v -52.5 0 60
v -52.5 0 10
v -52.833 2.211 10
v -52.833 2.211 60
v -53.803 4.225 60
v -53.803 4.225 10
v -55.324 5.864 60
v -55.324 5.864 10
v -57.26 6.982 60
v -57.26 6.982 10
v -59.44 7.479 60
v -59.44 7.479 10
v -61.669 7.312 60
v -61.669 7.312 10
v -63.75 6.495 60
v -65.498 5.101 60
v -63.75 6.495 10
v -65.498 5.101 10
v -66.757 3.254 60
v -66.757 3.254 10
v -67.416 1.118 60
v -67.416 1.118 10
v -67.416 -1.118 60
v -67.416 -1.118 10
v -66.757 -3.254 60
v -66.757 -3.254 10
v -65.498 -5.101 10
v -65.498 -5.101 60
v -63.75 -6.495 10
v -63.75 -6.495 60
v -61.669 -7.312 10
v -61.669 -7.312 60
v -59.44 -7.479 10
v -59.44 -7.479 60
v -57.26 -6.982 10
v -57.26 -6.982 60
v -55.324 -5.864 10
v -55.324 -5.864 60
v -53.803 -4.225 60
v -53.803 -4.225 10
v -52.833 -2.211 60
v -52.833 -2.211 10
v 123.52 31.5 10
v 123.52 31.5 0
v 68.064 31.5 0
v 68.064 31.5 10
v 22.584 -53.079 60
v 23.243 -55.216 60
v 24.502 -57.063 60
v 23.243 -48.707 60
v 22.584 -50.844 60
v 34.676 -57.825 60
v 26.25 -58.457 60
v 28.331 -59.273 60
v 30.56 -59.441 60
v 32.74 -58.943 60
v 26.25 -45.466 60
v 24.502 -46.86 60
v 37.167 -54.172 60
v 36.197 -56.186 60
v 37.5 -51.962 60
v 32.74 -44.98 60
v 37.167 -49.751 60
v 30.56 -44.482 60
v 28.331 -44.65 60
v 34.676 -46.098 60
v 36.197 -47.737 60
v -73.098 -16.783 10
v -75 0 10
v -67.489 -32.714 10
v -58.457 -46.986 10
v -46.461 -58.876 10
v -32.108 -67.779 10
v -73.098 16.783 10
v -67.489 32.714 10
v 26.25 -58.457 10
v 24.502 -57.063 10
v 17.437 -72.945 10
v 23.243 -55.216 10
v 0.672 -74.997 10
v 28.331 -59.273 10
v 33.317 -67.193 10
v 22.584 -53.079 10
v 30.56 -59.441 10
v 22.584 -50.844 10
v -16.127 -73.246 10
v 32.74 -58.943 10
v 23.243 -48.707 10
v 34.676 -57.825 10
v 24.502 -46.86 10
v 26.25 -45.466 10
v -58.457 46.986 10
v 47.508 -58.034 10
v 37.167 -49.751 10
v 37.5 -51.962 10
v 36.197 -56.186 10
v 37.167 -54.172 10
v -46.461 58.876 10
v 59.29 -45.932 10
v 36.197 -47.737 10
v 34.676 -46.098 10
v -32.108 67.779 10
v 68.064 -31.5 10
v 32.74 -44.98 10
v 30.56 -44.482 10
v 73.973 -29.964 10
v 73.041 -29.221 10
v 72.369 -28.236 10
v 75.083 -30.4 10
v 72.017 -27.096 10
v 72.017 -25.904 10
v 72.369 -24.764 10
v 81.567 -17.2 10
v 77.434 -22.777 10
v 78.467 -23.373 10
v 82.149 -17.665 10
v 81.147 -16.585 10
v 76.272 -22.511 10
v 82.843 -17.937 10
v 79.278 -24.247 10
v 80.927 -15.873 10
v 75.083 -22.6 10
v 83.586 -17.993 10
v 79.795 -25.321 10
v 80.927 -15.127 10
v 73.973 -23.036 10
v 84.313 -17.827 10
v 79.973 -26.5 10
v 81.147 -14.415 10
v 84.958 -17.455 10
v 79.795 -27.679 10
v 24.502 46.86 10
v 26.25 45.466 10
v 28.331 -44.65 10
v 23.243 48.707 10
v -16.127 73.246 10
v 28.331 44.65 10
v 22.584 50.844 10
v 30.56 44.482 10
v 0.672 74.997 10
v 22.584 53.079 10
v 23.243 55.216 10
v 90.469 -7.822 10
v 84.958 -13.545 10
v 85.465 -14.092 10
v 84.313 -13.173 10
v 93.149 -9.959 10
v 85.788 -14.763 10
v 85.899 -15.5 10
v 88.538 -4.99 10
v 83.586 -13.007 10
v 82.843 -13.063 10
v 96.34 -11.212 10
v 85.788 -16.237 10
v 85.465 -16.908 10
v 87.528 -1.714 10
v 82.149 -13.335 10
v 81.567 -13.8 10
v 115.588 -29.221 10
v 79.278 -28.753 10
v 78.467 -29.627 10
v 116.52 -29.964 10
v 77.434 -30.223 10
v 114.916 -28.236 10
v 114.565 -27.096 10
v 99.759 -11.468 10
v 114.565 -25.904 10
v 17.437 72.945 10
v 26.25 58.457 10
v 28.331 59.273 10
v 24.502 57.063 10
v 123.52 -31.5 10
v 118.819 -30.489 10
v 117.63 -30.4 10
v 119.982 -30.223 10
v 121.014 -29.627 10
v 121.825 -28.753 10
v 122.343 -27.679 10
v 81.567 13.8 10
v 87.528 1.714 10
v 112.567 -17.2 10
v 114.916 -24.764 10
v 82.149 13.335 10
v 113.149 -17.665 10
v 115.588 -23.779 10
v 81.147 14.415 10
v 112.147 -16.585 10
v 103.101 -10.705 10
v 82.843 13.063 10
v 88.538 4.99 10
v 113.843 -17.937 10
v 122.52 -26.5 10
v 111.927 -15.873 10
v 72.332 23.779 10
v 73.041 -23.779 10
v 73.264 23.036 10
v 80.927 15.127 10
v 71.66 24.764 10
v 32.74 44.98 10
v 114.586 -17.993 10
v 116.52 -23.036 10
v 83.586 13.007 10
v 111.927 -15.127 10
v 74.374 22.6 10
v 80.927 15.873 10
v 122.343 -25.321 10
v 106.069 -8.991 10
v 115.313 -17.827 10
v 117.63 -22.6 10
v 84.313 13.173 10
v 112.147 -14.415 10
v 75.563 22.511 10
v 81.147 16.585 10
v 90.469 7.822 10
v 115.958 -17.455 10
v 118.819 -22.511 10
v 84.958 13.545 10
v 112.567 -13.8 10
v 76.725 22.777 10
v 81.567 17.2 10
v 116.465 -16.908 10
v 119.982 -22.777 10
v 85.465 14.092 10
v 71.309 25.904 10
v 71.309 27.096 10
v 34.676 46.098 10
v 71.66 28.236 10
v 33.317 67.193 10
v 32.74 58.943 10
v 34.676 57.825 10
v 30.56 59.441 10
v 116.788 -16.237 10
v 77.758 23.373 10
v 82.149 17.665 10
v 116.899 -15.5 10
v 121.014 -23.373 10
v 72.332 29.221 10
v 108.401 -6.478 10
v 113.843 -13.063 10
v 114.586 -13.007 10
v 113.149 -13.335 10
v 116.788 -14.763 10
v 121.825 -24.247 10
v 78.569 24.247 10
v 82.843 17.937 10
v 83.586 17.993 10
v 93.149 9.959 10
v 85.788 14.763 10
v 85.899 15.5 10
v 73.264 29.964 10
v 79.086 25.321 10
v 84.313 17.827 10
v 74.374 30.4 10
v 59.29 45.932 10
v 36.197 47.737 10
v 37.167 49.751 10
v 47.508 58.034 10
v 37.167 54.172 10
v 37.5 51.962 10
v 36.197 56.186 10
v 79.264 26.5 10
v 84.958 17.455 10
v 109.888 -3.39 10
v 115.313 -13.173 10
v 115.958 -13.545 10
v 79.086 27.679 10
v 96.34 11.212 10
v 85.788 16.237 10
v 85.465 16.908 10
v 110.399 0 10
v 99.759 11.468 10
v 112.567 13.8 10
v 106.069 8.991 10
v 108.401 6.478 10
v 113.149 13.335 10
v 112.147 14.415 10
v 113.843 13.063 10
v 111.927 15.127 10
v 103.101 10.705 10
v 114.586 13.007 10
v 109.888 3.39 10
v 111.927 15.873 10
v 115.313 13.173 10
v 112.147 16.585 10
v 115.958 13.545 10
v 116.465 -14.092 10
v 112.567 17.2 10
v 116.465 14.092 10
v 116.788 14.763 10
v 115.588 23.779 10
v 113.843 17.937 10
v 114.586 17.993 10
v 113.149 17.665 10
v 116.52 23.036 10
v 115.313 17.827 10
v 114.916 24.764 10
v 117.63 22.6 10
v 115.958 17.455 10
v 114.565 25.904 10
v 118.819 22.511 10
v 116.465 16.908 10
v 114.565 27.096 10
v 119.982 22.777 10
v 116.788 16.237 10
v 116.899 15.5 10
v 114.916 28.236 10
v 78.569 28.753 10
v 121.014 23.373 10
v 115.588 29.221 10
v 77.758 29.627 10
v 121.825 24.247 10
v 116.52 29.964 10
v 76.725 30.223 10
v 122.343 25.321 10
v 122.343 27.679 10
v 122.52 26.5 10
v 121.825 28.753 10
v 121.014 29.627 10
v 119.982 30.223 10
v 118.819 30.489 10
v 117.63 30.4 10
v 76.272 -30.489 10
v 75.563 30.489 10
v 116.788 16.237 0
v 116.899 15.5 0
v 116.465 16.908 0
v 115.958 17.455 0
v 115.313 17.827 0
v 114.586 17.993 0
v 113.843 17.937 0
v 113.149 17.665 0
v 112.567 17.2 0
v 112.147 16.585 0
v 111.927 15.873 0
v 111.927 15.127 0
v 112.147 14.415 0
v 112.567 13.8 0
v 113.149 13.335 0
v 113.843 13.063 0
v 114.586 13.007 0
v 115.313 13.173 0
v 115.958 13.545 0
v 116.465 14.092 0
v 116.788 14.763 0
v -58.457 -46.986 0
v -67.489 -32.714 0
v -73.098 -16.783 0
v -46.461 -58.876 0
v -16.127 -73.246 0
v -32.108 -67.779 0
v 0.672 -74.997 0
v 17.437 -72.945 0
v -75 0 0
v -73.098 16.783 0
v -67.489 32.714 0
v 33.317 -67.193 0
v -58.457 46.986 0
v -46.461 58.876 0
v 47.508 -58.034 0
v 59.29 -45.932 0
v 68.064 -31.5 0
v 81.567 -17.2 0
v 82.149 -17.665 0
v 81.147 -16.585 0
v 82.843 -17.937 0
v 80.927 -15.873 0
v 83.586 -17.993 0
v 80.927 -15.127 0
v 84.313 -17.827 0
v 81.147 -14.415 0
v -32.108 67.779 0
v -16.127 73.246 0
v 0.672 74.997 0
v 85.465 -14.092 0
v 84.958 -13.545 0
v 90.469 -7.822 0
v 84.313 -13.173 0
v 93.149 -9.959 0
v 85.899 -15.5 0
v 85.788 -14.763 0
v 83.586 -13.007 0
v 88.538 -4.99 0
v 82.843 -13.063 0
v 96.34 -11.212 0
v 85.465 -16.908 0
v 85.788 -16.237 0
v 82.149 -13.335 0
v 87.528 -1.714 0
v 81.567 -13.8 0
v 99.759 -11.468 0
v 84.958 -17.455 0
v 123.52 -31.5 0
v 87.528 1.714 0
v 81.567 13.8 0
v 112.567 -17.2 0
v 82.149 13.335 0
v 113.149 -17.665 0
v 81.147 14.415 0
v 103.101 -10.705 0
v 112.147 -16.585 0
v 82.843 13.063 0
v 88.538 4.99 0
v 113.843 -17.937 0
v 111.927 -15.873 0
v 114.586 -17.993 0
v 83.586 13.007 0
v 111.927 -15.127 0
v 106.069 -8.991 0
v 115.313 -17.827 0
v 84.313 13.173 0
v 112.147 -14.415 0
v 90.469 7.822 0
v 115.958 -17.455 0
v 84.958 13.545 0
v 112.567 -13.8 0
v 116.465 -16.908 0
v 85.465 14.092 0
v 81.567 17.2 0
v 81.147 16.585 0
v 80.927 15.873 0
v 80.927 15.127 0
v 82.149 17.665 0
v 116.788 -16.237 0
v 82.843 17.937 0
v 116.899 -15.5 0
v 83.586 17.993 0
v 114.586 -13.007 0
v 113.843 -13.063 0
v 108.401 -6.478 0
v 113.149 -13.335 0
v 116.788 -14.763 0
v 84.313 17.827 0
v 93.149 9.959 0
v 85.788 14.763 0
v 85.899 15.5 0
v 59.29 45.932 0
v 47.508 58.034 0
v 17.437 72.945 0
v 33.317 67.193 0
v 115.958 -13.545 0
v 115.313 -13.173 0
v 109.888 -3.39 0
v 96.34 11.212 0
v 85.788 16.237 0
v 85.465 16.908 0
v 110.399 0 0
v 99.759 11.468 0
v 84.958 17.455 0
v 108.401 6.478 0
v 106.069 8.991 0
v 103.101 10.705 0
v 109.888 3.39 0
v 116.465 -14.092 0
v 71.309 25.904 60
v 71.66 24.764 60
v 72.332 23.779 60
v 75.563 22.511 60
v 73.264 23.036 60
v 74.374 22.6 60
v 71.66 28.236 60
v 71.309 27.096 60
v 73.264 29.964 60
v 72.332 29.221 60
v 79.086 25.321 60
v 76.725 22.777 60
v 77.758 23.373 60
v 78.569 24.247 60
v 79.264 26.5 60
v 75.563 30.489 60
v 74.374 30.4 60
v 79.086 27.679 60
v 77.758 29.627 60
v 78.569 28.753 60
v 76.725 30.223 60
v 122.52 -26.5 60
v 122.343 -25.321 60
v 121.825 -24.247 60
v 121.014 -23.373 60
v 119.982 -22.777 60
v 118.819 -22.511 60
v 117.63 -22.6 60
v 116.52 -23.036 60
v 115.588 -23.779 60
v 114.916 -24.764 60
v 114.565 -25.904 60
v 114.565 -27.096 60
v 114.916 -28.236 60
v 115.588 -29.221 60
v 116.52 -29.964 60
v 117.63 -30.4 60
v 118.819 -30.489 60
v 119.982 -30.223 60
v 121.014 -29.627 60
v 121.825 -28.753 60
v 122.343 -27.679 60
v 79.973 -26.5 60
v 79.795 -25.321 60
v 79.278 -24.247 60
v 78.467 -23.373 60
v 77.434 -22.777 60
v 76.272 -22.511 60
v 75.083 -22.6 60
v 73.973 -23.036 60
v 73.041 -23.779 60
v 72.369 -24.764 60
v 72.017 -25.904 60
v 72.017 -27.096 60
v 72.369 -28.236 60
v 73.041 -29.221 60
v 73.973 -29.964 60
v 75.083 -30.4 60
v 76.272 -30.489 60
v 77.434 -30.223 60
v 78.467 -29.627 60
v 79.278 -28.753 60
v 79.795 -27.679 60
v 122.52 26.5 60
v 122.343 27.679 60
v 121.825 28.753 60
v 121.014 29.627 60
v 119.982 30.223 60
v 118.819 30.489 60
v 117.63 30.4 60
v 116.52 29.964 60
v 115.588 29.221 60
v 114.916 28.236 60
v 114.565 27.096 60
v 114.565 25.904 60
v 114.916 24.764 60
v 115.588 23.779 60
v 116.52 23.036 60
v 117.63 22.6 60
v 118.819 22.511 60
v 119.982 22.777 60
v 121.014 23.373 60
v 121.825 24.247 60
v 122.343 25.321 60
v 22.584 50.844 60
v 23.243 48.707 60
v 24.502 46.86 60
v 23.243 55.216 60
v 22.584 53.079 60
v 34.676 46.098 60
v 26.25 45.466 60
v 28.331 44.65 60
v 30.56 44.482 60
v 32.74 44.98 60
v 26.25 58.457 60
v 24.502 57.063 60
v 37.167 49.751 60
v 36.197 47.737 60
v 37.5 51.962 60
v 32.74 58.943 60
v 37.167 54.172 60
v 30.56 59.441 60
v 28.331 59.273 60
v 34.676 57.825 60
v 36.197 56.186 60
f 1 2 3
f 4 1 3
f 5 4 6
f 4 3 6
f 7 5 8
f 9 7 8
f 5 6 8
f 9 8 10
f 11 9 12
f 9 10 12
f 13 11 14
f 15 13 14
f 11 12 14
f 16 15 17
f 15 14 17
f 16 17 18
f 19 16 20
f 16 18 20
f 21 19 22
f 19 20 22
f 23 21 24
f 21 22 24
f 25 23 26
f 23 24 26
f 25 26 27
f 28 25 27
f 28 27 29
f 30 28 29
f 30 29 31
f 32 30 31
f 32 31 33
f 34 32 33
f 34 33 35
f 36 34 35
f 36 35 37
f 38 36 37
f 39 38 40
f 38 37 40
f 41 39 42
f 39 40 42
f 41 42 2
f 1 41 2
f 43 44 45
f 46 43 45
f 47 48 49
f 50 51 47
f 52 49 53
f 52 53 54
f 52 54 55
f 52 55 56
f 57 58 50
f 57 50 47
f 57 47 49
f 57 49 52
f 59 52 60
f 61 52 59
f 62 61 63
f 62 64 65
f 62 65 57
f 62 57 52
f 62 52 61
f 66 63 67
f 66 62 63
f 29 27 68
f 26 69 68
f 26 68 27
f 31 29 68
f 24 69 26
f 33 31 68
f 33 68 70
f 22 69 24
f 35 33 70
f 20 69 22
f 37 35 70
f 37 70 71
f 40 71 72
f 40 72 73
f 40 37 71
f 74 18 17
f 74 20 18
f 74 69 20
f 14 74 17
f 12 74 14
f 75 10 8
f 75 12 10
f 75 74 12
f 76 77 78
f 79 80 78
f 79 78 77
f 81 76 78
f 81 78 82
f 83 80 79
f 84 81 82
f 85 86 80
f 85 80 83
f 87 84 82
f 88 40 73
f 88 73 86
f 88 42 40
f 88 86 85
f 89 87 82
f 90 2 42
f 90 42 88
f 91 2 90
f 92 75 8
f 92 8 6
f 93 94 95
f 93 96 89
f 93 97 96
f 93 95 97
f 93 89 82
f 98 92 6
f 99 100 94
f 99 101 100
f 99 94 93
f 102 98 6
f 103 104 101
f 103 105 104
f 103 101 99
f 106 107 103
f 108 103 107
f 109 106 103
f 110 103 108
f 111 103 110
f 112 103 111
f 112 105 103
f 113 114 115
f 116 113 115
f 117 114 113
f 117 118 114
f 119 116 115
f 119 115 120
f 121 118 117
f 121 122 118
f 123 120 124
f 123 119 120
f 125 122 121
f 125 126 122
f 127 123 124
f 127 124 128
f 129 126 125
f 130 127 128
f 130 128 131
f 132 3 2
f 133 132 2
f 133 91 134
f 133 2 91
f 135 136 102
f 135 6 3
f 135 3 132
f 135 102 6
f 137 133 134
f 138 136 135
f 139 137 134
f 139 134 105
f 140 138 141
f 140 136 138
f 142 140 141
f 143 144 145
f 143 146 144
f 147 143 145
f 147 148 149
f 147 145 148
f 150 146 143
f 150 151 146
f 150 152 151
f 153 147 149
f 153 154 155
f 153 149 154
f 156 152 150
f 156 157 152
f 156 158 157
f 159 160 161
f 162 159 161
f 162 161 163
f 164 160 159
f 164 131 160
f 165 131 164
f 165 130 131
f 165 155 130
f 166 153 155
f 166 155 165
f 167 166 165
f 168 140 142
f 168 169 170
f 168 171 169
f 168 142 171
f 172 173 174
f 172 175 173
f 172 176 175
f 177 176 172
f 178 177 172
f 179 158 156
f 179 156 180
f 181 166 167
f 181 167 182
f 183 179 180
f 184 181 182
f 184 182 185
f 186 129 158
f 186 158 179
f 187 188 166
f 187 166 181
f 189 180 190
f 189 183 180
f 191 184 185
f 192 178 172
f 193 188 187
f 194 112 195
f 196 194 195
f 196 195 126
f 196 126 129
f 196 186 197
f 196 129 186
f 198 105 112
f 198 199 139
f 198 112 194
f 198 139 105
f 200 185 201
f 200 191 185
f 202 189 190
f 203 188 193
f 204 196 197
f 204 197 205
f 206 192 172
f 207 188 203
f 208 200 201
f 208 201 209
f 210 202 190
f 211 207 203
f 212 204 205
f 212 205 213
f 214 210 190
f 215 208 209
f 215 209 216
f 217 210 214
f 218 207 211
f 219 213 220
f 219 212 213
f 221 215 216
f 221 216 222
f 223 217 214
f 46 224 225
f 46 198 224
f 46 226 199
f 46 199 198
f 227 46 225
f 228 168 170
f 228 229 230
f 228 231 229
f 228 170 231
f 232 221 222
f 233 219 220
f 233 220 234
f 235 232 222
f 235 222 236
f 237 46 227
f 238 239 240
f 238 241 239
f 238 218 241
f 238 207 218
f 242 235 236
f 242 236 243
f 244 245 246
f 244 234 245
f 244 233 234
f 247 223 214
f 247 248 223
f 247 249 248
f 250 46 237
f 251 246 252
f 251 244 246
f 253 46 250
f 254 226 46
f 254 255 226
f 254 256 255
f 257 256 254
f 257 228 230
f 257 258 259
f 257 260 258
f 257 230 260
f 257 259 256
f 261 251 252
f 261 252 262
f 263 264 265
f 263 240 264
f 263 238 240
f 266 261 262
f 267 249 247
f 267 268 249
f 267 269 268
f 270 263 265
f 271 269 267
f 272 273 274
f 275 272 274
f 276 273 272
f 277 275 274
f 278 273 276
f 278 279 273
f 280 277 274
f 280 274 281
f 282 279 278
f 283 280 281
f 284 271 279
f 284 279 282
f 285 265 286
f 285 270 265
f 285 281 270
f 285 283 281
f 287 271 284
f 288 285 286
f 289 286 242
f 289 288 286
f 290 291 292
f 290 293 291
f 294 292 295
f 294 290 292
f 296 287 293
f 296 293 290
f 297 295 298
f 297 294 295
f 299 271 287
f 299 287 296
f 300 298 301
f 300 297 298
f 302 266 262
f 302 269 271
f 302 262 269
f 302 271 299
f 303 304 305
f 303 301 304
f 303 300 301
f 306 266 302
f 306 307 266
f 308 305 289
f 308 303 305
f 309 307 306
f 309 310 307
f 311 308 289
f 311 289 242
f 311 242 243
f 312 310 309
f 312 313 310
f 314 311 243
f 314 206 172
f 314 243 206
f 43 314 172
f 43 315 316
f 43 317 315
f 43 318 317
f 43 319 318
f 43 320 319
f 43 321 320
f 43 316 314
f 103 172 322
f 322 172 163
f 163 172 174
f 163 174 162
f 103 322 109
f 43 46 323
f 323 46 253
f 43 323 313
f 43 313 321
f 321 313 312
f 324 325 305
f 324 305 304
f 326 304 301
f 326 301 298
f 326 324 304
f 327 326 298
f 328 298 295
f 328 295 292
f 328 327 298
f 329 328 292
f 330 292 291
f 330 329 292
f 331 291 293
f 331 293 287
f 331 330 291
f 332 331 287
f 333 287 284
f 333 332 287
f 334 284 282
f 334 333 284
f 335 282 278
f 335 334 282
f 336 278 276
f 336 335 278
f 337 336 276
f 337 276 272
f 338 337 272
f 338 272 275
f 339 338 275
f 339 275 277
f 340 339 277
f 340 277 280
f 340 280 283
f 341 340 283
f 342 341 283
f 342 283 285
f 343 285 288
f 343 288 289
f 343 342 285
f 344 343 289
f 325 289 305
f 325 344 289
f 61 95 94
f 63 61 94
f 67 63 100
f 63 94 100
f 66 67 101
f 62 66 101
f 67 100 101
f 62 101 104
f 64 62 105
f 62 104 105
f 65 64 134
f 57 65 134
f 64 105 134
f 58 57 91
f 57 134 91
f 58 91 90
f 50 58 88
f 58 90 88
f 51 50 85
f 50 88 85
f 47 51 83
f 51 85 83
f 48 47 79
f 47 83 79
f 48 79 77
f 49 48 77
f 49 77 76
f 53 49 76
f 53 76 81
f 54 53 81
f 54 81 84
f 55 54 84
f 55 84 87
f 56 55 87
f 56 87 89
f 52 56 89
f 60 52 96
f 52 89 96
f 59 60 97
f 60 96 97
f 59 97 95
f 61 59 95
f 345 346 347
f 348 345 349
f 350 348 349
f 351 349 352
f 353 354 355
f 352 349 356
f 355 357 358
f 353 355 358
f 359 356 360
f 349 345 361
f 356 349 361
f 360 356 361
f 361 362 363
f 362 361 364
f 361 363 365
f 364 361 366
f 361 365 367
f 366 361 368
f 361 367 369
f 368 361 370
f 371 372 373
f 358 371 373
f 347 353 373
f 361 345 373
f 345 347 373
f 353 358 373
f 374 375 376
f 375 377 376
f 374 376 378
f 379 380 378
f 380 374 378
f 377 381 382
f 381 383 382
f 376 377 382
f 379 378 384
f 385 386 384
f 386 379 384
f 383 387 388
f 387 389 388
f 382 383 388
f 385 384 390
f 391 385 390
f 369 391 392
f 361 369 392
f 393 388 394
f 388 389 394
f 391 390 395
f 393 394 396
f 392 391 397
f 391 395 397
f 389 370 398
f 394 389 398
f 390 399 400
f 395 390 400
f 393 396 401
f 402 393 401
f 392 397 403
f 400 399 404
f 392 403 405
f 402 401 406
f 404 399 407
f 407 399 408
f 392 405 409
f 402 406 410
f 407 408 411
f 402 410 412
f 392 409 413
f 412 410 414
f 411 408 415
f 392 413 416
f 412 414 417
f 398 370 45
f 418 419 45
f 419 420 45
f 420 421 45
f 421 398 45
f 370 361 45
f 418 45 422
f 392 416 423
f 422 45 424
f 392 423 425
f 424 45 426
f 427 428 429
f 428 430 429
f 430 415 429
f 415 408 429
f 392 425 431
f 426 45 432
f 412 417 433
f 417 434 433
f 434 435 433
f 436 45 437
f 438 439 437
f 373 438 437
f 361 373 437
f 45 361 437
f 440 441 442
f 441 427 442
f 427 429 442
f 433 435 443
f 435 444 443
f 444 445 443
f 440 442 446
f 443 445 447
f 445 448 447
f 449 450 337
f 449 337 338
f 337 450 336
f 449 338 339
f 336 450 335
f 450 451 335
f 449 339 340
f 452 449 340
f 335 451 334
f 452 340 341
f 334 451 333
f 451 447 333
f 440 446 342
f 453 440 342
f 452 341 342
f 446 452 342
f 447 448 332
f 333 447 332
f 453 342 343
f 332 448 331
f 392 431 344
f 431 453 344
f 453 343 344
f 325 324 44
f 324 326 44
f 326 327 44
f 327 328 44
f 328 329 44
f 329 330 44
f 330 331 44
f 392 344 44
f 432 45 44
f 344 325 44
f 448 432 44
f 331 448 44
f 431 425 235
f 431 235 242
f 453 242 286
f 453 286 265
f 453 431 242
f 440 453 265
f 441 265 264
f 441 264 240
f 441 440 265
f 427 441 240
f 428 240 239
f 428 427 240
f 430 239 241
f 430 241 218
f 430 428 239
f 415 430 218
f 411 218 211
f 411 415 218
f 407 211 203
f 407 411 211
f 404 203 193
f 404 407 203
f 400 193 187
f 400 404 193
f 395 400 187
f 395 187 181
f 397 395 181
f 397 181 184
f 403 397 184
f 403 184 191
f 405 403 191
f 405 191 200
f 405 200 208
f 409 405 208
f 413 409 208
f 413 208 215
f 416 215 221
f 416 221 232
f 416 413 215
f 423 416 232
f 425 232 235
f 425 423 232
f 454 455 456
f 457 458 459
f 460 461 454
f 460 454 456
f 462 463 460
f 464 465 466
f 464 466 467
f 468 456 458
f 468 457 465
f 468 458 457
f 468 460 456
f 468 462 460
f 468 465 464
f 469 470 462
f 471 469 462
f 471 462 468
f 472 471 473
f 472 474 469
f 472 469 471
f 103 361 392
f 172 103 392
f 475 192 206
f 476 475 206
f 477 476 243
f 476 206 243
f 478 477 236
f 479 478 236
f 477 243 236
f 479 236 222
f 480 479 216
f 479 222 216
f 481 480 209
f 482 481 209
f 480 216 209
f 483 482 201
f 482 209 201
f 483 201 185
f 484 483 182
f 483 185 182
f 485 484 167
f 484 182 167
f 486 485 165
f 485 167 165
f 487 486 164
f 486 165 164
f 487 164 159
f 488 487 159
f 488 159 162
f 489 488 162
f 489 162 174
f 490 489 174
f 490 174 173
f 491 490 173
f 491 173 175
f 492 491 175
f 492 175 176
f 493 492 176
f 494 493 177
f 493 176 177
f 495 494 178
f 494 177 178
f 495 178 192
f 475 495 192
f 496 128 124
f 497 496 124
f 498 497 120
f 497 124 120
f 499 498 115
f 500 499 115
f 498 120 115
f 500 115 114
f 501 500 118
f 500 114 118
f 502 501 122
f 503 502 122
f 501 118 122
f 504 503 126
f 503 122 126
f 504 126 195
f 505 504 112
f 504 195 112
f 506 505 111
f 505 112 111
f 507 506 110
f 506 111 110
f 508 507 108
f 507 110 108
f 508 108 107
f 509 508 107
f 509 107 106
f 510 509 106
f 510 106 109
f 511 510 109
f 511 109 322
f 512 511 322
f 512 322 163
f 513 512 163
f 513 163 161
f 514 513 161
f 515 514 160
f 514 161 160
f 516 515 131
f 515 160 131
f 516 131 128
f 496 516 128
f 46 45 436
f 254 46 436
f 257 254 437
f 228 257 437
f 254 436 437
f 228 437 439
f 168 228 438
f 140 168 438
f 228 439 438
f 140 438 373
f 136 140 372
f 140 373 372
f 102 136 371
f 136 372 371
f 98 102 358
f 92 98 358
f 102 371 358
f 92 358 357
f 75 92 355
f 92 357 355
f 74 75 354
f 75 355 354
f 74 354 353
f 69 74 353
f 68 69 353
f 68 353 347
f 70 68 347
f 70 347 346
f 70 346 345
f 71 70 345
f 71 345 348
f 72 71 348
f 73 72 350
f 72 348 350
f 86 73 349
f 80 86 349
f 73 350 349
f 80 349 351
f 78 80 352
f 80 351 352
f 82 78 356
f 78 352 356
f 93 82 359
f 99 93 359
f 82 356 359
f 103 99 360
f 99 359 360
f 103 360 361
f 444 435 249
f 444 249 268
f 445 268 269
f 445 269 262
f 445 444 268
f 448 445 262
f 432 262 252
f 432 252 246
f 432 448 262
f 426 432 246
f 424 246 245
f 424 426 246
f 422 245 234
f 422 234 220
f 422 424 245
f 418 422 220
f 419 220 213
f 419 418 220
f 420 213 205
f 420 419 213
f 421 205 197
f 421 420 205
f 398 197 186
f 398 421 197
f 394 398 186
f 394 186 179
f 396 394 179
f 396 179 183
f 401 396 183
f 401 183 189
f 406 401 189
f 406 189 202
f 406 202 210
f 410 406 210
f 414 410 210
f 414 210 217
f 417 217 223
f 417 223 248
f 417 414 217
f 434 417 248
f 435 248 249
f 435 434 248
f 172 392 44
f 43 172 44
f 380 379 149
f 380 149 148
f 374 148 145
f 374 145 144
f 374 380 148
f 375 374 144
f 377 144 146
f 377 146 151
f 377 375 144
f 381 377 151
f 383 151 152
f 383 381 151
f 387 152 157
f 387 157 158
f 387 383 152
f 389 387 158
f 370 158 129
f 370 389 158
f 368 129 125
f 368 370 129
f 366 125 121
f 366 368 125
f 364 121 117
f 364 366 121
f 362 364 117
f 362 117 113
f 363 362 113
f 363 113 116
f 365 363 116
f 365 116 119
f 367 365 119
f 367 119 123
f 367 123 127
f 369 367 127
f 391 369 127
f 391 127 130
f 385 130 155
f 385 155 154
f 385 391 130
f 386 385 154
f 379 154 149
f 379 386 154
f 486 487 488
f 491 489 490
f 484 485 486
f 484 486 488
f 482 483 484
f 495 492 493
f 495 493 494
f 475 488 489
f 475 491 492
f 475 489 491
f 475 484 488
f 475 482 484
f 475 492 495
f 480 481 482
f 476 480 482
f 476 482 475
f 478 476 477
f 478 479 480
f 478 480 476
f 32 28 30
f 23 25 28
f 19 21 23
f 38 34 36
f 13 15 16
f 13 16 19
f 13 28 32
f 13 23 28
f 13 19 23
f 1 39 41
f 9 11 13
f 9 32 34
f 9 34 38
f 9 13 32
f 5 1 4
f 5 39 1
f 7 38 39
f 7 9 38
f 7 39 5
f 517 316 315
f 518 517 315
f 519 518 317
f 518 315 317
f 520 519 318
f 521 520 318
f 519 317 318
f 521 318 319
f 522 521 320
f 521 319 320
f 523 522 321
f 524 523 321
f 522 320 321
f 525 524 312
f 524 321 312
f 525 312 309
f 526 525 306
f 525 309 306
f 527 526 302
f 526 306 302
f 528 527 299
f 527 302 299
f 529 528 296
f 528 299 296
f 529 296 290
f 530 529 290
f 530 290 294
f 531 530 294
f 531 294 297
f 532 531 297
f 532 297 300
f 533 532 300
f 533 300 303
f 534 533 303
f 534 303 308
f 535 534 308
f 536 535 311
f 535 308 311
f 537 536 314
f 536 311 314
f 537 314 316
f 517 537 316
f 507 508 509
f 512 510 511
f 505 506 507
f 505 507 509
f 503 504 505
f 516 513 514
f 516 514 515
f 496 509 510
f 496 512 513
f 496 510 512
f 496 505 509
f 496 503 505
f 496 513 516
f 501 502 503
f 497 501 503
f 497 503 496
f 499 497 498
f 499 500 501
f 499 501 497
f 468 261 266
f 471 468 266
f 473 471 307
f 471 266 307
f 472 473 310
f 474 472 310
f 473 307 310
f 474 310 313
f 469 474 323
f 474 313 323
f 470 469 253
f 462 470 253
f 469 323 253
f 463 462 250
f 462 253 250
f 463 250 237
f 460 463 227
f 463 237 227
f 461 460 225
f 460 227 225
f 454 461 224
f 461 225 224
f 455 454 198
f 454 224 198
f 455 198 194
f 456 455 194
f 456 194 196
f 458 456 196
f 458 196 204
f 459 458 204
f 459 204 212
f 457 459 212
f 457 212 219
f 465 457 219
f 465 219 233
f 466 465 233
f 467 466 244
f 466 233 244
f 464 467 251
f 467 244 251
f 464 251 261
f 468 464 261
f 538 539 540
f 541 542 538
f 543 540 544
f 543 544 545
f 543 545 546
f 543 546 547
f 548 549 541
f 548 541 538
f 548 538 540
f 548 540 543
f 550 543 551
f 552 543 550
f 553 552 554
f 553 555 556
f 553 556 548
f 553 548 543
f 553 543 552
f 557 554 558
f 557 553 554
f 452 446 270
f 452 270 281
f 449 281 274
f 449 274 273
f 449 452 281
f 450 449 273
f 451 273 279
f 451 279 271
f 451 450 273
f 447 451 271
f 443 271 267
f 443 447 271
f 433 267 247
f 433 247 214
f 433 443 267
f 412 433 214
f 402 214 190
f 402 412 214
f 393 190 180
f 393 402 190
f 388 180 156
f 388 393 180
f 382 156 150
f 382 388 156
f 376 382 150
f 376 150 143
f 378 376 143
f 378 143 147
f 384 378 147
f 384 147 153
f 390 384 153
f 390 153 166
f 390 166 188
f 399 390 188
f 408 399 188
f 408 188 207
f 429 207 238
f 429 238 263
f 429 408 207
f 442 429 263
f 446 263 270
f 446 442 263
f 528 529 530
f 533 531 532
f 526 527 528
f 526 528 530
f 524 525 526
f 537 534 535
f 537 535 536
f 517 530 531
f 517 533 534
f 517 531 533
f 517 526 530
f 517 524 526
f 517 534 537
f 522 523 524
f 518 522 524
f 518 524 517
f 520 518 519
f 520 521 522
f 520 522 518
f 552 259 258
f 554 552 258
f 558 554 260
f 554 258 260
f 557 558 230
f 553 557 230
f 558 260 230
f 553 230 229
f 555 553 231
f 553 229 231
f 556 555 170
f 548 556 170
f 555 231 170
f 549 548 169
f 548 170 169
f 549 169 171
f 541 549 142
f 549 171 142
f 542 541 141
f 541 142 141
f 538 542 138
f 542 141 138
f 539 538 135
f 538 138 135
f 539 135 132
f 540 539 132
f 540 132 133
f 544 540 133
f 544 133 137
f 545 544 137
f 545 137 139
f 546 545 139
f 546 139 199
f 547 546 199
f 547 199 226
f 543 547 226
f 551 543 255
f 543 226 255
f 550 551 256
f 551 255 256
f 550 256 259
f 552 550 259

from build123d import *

# Parameters (mm, degrees)
F1_DEPTH = 10
F2_R     = 2.5
F3_DEPTH = 10
F2_R_2   = 11.5
F4_DEPTH = 10
F5_R     = 7.5
F5_R_2   = 4
F6_DEPTH = 50


with BuildPart() as f1:
    # F0 (on Top) → F1 (new body)
    with BuildSketch(Plane.XY):
        with BuildLine():
            ThreePointArc((68.064308, -31.5), (73.245556, -16.127258), (75, 0))
            ThreePointArc((75, 0), (73.245556, 16.127258), (68.064308, 31.5))
            ThreePointArc((68.064308, 31.5), (-75, 0), (68.064308, -31.5))
        make_face()
        with BuildLine():
            ThreePointArc((68.064308, 31.5), (73.245556, 16.127258), (75, 0))
            ThreePointArc((75, 0), (73.245556, -16.127258), (68.064308, -31.5))
            Line((68.064308, -31.5), (123.52035, -31.5))
            Line((123.52035, -31.5), (123.52035, 31.5))
            Line((123.52035, 31.5), (68.064308, 31.5))
        make_face()
    extrude(amount=F1_DEPTH)

    # F2 (on face) → F3 (cut, through all)
    with BuildSketch(Plane.XY):
        with Locations((114.399239, 15.5)):
            Circle(F2_R)
        with Locations((83.399239, 15.5)):
            Circle(F2_R)
        with Locations((83.399239, -15.5)):
            Circle(F2_R)
        with Locations((114.399239, -15.5)):
            Circle(F2_R)
    extrude(amount=F3_DEPTH, mode=Mode.SUBTRACT)

    # F2 (on face) → F4 (cut, through all)
    with BuildSketch(Plane.XY):
        with Locations((98.899239, 0)):
            Circle(F2_R_2)
    extrude(amount=F4_DEPTH, mode=Mode.SUBTRACT)

    # F5 (on face) → F6 (join)
    with BuildSketch(Plane.XY.offset(10)):
        with Locations((-60, 0)):
            Circle(F5_R)
        with Locations((30, 51.961524)):
            Circle(F5_R)
        with Locations((30, -51.961524)):
            Circle(F5_R)
        with Locations((75.972773, -26.5)):
            Circle(F5_R_2)
        with Locations((118.52035, -26.5)):
            Circle(F5_R_2)
        with Locations((75.264111, 26.5)):
            Circle(F5_R_2)
        with Locations((118.52035, 26.5)):
            Circle(F5_R_2)
    extrude(amount=F6_DEPTH)


solid = f1.part
